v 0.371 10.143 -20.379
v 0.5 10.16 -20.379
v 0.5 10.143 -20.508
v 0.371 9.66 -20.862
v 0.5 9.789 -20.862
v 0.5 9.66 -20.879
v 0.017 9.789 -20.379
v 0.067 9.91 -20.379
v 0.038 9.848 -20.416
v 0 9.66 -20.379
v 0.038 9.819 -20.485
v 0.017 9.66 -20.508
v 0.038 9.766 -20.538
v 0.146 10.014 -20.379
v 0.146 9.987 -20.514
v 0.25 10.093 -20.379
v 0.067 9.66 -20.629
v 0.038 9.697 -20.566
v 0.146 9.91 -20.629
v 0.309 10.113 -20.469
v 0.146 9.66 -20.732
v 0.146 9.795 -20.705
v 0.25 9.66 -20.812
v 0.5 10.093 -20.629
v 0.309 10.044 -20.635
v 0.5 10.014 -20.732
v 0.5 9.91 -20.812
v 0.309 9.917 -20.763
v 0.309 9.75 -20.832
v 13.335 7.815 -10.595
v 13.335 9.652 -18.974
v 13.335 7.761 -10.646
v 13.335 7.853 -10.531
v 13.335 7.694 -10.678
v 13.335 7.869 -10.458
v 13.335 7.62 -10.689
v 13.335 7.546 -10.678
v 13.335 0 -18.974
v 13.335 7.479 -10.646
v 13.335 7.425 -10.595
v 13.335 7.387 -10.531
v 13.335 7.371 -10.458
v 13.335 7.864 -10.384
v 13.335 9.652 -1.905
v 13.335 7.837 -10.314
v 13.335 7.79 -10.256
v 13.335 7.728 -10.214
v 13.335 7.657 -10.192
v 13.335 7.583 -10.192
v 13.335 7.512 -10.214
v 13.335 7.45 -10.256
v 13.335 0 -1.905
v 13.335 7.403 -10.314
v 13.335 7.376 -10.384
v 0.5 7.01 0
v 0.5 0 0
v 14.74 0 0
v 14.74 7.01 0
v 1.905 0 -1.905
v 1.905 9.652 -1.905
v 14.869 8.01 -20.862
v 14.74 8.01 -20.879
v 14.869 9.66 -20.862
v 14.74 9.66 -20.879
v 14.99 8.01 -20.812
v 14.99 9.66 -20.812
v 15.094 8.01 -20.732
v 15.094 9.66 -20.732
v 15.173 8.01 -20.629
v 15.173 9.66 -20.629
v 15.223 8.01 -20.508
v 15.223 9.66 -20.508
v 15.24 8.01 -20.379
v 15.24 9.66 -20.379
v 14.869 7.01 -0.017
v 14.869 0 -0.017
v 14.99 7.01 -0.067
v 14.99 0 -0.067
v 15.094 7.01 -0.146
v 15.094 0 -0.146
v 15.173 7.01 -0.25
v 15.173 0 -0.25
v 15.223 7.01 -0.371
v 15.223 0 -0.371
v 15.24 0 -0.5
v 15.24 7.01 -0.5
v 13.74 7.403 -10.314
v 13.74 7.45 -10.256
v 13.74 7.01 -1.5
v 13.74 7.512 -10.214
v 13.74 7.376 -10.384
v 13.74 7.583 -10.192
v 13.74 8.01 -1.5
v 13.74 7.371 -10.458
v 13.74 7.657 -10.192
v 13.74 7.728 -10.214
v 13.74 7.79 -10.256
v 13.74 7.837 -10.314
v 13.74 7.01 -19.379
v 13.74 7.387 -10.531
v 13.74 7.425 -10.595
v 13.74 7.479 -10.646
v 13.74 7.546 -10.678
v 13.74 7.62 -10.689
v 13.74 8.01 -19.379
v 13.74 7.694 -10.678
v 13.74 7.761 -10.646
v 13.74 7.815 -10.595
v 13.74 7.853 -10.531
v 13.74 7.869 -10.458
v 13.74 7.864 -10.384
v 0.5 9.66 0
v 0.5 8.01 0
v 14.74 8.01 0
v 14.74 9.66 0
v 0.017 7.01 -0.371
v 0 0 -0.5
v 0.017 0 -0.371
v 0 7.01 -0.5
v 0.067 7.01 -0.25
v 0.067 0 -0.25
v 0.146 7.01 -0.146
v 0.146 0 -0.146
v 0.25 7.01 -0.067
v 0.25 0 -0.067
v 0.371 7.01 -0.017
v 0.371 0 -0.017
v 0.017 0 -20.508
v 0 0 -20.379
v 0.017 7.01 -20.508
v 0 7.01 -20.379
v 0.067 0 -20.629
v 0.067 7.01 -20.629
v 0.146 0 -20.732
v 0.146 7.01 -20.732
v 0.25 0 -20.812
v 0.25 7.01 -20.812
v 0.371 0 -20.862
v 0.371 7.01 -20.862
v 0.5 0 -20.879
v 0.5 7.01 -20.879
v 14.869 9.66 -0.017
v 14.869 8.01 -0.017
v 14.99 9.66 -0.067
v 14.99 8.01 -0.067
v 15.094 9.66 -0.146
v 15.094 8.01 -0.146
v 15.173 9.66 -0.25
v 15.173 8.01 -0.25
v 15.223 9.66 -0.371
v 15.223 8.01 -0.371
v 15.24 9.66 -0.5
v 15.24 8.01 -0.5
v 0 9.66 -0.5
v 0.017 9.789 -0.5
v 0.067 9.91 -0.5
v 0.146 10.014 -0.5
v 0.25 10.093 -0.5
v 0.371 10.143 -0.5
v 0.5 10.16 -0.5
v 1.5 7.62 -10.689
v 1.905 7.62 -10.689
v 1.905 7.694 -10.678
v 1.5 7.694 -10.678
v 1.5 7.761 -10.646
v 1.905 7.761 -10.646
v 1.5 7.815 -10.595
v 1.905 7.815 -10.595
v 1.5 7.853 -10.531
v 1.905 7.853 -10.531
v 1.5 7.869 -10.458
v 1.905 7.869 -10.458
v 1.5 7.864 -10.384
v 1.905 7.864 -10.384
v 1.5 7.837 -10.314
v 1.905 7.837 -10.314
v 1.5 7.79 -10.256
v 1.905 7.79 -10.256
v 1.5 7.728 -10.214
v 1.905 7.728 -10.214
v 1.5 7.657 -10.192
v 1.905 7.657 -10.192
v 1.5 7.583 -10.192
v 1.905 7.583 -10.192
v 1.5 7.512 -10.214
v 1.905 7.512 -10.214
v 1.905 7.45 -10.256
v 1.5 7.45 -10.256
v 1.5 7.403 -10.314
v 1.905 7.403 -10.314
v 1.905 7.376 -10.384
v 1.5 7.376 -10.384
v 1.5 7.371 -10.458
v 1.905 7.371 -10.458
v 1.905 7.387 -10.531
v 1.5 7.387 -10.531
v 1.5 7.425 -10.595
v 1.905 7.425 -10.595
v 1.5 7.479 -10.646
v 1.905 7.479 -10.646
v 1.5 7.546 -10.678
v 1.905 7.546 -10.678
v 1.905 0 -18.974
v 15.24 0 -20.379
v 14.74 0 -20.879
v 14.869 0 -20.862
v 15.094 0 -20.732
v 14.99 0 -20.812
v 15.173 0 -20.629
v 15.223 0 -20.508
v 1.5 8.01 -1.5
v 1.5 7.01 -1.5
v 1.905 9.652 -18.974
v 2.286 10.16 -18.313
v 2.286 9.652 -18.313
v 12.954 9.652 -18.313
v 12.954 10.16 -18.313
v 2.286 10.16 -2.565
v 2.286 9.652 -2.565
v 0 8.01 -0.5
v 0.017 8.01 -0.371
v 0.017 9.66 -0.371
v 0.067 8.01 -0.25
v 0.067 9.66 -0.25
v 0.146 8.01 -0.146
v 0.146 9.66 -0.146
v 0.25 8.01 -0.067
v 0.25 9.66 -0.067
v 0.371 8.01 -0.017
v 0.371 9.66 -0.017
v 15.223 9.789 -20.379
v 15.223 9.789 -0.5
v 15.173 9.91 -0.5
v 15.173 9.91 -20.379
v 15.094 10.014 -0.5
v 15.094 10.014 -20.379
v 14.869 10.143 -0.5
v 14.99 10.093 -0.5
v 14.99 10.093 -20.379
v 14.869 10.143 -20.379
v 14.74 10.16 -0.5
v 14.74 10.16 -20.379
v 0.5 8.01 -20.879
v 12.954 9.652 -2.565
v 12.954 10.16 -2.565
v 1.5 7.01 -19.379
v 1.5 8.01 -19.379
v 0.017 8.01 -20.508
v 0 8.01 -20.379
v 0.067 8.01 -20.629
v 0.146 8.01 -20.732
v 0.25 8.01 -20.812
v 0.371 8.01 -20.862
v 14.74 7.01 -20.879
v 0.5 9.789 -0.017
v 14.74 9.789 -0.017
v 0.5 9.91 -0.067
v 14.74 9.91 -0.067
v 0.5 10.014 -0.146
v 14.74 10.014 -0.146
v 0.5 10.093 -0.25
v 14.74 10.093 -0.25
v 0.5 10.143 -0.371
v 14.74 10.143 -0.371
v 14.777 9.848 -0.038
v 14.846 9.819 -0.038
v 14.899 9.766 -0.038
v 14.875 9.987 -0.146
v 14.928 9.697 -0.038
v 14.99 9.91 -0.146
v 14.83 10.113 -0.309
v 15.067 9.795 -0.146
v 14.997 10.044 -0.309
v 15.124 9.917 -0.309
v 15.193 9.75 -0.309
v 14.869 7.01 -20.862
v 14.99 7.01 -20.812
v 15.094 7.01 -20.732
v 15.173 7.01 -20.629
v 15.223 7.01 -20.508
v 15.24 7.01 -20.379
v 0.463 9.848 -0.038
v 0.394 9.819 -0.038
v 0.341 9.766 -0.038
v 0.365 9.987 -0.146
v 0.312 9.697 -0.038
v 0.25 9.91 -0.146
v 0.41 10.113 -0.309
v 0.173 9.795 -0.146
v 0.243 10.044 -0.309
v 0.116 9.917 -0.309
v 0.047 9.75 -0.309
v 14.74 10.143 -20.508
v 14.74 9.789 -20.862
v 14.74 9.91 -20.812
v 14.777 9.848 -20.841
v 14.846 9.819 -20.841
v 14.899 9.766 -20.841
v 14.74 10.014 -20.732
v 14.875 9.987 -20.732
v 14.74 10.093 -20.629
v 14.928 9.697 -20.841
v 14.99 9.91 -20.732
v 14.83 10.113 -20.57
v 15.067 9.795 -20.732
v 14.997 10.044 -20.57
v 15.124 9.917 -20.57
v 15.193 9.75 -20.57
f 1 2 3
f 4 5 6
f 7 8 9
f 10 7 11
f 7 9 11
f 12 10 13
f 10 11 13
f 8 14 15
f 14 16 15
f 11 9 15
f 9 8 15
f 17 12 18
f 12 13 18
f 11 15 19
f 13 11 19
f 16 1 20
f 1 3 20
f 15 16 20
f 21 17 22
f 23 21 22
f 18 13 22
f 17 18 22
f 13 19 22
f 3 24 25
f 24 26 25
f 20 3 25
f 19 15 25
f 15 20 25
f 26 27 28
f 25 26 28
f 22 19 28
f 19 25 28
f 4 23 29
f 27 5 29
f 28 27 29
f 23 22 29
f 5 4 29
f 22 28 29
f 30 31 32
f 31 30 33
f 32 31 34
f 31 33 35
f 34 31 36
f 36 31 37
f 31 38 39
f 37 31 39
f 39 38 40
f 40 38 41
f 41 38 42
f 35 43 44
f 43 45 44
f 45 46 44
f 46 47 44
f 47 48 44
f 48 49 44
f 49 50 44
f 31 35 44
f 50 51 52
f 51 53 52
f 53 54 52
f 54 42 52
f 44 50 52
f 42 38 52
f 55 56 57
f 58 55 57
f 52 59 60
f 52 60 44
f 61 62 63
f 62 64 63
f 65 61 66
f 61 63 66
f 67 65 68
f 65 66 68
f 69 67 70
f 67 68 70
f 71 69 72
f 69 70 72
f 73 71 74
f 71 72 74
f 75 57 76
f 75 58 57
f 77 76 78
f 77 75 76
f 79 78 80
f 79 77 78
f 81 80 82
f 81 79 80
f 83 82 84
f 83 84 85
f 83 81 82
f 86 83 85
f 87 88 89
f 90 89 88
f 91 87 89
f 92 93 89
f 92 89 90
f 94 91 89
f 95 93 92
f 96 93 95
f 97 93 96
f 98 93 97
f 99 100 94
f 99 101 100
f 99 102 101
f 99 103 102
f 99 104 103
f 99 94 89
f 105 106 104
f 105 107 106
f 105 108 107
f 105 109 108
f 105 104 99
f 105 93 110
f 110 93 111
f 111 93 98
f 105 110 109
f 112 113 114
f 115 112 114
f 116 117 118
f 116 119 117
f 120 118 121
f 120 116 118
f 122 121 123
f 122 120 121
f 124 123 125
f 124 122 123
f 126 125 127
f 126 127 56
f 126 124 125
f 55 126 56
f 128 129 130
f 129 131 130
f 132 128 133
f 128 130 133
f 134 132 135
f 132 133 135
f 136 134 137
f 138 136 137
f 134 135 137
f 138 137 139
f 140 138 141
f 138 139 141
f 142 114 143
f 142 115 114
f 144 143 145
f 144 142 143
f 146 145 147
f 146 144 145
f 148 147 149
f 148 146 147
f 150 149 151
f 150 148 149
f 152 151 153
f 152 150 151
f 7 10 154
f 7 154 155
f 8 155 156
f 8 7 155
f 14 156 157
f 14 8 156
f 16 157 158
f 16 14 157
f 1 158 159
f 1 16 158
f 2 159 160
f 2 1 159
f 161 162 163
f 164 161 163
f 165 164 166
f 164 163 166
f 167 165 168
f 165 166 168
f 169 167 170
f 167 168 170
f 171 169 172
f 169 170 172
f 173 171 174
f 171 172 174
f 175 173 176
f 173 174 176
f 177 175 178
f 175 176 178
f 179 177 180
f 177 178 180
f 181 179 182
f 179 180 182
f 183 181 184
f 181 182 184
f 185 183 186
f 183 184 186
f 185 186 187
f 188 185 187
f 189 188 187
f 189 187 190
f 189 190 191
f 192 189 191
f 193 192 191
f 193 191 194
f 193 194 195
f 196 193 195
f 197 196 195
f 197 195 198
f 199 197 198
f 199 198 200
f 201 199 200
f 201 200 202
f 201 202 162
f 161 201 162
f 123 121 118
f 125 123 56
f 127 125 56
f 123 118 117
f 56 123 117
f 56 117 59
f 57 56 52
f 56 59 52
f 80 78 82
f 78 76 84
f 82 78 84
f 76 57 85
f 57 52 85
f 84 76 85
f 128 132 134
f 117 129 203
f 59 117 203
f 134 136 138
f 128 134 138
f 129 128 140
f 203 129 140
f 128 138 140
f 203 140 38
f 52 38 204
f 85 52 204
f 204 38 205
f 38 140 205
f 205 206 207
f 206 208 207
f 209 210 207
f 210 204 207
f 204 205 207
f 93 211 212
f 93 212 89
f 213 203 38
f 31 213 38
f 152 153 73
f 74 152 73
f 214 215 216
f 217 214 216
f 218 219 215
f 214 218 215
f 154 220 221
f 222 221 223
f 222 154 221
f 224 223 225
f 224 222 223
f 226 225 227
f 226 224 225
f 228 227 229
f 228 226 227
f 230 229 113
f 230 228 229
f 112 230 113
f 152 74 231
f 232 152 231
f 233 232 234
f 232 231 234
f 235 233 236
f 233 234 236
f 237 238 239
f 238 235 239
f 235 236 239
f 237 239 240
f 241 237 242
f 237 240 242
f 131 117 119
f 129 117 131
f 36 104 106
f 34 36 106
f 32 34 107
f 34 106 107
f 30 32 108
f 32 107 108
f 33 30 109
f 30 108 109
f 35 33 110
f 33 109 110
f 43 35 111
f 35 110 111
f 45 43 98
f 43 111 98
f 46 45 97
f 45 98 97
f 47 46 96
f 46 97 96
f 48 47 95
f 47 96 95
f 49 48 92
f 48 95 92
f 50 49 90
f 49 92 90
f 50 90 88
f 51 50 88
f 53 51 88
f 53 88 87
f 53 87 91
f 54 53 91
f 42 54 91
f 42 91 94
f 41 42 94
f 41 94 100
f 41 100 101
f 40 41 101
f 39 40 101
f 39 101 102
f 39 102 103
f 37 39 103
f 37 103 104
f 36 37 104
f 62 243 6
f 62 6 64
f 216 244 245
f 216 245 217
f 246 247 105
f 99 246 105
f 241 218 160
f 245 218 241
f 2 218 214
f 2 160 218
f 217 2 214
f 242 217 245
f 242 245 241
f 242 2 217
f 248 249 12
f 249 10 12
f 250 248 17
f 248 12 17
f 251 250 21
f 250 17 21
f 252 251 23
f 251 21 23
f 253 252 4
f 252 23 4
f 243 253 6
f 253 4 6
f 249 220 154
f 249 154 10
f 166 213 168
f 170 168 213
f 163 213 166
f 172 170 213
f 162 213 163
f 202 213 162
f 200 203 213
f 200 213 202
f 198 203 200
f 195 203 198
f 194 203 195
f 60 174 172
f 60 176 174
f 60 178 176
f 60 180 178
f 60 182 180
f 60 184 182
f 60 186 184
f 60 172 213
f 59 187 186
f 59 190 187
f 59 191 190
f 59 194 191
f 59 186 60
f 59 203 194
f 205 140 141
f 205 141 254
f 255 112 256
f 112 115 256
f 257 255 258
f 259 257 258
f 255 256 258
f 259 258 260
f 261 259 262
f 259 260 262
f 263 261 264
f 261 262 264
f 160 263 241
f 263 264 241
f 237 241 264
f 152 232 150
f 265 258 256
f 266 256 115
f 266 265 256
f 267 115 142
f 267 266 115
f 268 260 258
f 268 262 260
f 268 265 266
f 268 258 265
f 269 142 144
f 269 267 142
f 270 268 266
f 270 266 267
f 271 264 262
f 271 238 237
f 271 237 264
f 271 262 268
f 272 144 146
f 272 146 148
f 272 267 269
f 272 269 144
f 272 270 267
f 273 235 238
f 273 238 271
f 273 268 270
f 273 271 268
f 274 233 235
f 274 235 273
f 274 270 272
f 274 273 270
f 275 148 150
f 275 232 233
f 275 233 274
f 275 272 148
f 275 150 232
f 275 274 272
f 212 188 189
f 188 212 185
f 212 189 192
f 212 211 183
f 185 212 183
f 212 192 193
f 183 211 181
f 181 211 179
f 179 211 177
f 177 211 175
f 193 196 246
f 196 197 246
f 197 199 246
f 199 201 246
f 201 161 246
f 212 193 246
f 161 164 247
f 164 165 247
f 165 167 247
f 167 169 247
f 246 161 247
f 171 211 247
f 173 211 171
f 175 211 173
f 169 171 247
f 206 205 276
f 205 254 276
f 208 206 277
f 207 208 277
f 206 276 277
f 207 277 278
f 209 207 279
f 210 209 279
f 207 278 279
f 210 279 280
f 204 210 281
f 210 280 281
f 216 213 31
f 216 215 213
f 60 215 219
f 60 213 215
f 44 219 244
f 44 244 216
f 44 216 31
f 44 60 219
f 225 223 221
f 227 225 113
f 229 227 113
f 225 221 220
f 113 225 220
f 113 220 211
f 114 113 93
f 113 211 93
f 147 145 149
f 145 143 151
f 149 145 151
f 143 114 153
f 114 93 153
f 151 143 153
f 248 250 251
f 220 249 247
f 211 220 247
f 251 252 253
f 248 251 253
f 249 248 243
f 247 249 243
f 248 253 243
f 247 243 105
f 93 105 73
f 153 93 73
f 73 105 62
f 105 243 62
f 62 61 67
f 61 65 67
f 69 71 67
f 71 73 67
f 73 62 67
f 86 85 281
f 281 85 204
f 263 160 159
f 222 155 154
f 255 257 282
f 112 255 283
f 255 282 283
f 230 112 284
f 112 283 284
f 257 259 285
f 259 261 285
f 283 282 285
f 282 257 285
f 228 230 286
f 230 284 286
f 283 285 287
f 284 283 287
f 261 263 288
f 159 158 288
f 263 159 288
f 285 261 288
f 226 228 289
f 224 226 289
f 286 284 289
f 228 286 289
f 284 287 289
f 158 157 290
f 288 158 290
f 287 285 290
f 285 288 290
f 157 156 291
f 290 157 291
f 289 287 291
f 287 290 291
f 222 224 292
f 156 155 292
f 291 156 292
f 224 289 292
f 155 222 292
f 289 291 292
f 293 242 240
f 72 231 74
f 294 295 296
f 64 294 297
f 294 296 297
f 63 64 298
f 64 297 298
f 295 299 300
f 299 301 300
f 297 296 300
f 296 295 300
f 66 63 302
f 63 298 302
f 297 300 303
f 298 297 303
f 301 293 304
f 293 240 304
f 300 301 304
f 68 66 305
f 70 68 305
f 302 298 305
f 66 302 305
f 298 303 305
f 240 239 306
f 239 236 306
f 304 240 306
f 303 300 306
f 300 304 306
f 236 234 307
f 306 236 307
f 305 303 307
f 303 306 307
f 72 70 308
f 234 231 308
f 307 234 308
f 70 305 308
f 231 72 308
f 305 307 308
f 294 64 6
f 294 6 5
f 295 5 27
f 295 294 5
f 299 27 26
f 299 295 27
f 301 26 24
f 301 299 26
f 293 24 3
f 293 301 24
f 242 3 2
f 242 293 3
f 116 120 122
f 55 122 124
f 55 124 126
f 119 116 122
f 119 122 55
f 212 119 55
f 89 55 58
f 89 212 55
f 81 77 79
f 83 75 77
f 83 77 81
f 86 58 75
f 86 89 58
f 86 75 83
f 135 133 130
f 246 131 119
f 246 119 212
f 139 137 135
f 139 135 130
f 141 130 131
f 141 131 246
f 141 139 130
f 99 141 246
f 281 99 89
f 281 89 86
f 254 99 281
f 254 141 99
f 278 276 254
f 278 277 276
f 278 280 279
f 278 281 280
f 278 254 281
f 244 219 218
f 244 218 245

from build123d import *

# Parameters (mm, degrees)
SKETCH1_W           = 15.24
SKETCH1_H           = 20.8788
SKETCH1_W_2         = 10.668
SKETCH1_H_2         = 15.748
BOSS_EXTRUDE1_DEPTH = 10.16
SKETCH2_R           = 0.25
CUT_EXTRUDE1_DEPTH  = 16.24
SKETCH3_W           = 11.43
SKETCH3_H           = 17.0688
CUT_EXTRUDE2_DEPTH  = 9.652
SKETCH5_W           = 15.24
SKETCH5_H           = 20.8788
SKETCH5_W_2         = 12.24
SKETCH5_H_2         = 17.8788
CUT_EXTRUDE4_DEPTH  = 1
FILLET1_R           = 0.5


with BuildPart() as part:
    # Sketch1 → Boss-Extrude1 (new body)
    with BuildSketch(Plane(origin=(0, 0, 0), x_dir=(1, 0, 0), z_dir=(0, 1, 0))):
        with Locations((7.62, 10.4394)):
            Rectangle(SKETCH1_W, SKETCH1_H)
        with Locations((7.62, 10.4394)):
            Rectangle(SKETCH1_W_2, SKETCH1_H_2, mode=Mode.SUBTRACT)
    extrude(amount=BOSS_EXTRUDE1_DEPTH)

    # Sketch2 → Cut-Extrude1 (cut, through all)
    with BuildSketch(Plane(origin=(15.24, 0, 0), x_dir=(0, 0, -1), z_dir=(1, 0, 0))):
        with Locations((10.4394, 7.62)):
            Circle(SKETCH2_R)
    extrude(amount=-CUT_EXTRUDE1_DEPTH, mode=Mode.SUBTRACT)

    # Sketch3 → Cut-Extrude2 (cut)
    with BuildSketch(Plane.XZ):
        with Locations((7.62, -10.4394)):
            Rectangle(SKETCH3_W, SKETCH3_H)
    extrude(amount=-CUT_EXTRUDE2_DEPTH, mode=Mode.SUBTRACT)

    # Sketch5 → Cut-Extrude4 (cut)
    with BuildSketch(Plane(origin=(0, 8.01, 0), x_dir=(1, 0, 0), z_dir=(0, 1, 0))):
        with Locations((7.62, 10.4394)):
            Rectangle(SKETCH5_W, SKETCH5_H)
        with Locations((7.62, 10.4394)):
            Rectangle(SKETCH5_W_2, SKETCH5_H_2, mode=Mode.SUBTRACT)
    extrude(amount=-CUT_EXTRUDE4_DEPTH, mode=Mode.SUBTRACT)

    # Fillet1
    fillet1_edges = [part.edges().sort_by_distance(p)[0] for p in [
        (15.24, 10.16, -10.4394),
        (7.62, 10.16, -20.8788),
        (0, 10.16, -10.4394),
        (0, 3.505, -20.8788),
        (15.24, 3.505, -20.8788),
        (15.24, 3.505, 0),
        (0, 3.505, 0),
        (7.62, 10.16, 0),
        (0, 9.085, -20.8788),
        (15.24, 9.085, -20.8788),
        (15.24, 9.085, 0),
        (0, 9.085, 0),
    ]]
    fillet(fillet1_edges, radius=FILLET1_R)


solid = part.part
